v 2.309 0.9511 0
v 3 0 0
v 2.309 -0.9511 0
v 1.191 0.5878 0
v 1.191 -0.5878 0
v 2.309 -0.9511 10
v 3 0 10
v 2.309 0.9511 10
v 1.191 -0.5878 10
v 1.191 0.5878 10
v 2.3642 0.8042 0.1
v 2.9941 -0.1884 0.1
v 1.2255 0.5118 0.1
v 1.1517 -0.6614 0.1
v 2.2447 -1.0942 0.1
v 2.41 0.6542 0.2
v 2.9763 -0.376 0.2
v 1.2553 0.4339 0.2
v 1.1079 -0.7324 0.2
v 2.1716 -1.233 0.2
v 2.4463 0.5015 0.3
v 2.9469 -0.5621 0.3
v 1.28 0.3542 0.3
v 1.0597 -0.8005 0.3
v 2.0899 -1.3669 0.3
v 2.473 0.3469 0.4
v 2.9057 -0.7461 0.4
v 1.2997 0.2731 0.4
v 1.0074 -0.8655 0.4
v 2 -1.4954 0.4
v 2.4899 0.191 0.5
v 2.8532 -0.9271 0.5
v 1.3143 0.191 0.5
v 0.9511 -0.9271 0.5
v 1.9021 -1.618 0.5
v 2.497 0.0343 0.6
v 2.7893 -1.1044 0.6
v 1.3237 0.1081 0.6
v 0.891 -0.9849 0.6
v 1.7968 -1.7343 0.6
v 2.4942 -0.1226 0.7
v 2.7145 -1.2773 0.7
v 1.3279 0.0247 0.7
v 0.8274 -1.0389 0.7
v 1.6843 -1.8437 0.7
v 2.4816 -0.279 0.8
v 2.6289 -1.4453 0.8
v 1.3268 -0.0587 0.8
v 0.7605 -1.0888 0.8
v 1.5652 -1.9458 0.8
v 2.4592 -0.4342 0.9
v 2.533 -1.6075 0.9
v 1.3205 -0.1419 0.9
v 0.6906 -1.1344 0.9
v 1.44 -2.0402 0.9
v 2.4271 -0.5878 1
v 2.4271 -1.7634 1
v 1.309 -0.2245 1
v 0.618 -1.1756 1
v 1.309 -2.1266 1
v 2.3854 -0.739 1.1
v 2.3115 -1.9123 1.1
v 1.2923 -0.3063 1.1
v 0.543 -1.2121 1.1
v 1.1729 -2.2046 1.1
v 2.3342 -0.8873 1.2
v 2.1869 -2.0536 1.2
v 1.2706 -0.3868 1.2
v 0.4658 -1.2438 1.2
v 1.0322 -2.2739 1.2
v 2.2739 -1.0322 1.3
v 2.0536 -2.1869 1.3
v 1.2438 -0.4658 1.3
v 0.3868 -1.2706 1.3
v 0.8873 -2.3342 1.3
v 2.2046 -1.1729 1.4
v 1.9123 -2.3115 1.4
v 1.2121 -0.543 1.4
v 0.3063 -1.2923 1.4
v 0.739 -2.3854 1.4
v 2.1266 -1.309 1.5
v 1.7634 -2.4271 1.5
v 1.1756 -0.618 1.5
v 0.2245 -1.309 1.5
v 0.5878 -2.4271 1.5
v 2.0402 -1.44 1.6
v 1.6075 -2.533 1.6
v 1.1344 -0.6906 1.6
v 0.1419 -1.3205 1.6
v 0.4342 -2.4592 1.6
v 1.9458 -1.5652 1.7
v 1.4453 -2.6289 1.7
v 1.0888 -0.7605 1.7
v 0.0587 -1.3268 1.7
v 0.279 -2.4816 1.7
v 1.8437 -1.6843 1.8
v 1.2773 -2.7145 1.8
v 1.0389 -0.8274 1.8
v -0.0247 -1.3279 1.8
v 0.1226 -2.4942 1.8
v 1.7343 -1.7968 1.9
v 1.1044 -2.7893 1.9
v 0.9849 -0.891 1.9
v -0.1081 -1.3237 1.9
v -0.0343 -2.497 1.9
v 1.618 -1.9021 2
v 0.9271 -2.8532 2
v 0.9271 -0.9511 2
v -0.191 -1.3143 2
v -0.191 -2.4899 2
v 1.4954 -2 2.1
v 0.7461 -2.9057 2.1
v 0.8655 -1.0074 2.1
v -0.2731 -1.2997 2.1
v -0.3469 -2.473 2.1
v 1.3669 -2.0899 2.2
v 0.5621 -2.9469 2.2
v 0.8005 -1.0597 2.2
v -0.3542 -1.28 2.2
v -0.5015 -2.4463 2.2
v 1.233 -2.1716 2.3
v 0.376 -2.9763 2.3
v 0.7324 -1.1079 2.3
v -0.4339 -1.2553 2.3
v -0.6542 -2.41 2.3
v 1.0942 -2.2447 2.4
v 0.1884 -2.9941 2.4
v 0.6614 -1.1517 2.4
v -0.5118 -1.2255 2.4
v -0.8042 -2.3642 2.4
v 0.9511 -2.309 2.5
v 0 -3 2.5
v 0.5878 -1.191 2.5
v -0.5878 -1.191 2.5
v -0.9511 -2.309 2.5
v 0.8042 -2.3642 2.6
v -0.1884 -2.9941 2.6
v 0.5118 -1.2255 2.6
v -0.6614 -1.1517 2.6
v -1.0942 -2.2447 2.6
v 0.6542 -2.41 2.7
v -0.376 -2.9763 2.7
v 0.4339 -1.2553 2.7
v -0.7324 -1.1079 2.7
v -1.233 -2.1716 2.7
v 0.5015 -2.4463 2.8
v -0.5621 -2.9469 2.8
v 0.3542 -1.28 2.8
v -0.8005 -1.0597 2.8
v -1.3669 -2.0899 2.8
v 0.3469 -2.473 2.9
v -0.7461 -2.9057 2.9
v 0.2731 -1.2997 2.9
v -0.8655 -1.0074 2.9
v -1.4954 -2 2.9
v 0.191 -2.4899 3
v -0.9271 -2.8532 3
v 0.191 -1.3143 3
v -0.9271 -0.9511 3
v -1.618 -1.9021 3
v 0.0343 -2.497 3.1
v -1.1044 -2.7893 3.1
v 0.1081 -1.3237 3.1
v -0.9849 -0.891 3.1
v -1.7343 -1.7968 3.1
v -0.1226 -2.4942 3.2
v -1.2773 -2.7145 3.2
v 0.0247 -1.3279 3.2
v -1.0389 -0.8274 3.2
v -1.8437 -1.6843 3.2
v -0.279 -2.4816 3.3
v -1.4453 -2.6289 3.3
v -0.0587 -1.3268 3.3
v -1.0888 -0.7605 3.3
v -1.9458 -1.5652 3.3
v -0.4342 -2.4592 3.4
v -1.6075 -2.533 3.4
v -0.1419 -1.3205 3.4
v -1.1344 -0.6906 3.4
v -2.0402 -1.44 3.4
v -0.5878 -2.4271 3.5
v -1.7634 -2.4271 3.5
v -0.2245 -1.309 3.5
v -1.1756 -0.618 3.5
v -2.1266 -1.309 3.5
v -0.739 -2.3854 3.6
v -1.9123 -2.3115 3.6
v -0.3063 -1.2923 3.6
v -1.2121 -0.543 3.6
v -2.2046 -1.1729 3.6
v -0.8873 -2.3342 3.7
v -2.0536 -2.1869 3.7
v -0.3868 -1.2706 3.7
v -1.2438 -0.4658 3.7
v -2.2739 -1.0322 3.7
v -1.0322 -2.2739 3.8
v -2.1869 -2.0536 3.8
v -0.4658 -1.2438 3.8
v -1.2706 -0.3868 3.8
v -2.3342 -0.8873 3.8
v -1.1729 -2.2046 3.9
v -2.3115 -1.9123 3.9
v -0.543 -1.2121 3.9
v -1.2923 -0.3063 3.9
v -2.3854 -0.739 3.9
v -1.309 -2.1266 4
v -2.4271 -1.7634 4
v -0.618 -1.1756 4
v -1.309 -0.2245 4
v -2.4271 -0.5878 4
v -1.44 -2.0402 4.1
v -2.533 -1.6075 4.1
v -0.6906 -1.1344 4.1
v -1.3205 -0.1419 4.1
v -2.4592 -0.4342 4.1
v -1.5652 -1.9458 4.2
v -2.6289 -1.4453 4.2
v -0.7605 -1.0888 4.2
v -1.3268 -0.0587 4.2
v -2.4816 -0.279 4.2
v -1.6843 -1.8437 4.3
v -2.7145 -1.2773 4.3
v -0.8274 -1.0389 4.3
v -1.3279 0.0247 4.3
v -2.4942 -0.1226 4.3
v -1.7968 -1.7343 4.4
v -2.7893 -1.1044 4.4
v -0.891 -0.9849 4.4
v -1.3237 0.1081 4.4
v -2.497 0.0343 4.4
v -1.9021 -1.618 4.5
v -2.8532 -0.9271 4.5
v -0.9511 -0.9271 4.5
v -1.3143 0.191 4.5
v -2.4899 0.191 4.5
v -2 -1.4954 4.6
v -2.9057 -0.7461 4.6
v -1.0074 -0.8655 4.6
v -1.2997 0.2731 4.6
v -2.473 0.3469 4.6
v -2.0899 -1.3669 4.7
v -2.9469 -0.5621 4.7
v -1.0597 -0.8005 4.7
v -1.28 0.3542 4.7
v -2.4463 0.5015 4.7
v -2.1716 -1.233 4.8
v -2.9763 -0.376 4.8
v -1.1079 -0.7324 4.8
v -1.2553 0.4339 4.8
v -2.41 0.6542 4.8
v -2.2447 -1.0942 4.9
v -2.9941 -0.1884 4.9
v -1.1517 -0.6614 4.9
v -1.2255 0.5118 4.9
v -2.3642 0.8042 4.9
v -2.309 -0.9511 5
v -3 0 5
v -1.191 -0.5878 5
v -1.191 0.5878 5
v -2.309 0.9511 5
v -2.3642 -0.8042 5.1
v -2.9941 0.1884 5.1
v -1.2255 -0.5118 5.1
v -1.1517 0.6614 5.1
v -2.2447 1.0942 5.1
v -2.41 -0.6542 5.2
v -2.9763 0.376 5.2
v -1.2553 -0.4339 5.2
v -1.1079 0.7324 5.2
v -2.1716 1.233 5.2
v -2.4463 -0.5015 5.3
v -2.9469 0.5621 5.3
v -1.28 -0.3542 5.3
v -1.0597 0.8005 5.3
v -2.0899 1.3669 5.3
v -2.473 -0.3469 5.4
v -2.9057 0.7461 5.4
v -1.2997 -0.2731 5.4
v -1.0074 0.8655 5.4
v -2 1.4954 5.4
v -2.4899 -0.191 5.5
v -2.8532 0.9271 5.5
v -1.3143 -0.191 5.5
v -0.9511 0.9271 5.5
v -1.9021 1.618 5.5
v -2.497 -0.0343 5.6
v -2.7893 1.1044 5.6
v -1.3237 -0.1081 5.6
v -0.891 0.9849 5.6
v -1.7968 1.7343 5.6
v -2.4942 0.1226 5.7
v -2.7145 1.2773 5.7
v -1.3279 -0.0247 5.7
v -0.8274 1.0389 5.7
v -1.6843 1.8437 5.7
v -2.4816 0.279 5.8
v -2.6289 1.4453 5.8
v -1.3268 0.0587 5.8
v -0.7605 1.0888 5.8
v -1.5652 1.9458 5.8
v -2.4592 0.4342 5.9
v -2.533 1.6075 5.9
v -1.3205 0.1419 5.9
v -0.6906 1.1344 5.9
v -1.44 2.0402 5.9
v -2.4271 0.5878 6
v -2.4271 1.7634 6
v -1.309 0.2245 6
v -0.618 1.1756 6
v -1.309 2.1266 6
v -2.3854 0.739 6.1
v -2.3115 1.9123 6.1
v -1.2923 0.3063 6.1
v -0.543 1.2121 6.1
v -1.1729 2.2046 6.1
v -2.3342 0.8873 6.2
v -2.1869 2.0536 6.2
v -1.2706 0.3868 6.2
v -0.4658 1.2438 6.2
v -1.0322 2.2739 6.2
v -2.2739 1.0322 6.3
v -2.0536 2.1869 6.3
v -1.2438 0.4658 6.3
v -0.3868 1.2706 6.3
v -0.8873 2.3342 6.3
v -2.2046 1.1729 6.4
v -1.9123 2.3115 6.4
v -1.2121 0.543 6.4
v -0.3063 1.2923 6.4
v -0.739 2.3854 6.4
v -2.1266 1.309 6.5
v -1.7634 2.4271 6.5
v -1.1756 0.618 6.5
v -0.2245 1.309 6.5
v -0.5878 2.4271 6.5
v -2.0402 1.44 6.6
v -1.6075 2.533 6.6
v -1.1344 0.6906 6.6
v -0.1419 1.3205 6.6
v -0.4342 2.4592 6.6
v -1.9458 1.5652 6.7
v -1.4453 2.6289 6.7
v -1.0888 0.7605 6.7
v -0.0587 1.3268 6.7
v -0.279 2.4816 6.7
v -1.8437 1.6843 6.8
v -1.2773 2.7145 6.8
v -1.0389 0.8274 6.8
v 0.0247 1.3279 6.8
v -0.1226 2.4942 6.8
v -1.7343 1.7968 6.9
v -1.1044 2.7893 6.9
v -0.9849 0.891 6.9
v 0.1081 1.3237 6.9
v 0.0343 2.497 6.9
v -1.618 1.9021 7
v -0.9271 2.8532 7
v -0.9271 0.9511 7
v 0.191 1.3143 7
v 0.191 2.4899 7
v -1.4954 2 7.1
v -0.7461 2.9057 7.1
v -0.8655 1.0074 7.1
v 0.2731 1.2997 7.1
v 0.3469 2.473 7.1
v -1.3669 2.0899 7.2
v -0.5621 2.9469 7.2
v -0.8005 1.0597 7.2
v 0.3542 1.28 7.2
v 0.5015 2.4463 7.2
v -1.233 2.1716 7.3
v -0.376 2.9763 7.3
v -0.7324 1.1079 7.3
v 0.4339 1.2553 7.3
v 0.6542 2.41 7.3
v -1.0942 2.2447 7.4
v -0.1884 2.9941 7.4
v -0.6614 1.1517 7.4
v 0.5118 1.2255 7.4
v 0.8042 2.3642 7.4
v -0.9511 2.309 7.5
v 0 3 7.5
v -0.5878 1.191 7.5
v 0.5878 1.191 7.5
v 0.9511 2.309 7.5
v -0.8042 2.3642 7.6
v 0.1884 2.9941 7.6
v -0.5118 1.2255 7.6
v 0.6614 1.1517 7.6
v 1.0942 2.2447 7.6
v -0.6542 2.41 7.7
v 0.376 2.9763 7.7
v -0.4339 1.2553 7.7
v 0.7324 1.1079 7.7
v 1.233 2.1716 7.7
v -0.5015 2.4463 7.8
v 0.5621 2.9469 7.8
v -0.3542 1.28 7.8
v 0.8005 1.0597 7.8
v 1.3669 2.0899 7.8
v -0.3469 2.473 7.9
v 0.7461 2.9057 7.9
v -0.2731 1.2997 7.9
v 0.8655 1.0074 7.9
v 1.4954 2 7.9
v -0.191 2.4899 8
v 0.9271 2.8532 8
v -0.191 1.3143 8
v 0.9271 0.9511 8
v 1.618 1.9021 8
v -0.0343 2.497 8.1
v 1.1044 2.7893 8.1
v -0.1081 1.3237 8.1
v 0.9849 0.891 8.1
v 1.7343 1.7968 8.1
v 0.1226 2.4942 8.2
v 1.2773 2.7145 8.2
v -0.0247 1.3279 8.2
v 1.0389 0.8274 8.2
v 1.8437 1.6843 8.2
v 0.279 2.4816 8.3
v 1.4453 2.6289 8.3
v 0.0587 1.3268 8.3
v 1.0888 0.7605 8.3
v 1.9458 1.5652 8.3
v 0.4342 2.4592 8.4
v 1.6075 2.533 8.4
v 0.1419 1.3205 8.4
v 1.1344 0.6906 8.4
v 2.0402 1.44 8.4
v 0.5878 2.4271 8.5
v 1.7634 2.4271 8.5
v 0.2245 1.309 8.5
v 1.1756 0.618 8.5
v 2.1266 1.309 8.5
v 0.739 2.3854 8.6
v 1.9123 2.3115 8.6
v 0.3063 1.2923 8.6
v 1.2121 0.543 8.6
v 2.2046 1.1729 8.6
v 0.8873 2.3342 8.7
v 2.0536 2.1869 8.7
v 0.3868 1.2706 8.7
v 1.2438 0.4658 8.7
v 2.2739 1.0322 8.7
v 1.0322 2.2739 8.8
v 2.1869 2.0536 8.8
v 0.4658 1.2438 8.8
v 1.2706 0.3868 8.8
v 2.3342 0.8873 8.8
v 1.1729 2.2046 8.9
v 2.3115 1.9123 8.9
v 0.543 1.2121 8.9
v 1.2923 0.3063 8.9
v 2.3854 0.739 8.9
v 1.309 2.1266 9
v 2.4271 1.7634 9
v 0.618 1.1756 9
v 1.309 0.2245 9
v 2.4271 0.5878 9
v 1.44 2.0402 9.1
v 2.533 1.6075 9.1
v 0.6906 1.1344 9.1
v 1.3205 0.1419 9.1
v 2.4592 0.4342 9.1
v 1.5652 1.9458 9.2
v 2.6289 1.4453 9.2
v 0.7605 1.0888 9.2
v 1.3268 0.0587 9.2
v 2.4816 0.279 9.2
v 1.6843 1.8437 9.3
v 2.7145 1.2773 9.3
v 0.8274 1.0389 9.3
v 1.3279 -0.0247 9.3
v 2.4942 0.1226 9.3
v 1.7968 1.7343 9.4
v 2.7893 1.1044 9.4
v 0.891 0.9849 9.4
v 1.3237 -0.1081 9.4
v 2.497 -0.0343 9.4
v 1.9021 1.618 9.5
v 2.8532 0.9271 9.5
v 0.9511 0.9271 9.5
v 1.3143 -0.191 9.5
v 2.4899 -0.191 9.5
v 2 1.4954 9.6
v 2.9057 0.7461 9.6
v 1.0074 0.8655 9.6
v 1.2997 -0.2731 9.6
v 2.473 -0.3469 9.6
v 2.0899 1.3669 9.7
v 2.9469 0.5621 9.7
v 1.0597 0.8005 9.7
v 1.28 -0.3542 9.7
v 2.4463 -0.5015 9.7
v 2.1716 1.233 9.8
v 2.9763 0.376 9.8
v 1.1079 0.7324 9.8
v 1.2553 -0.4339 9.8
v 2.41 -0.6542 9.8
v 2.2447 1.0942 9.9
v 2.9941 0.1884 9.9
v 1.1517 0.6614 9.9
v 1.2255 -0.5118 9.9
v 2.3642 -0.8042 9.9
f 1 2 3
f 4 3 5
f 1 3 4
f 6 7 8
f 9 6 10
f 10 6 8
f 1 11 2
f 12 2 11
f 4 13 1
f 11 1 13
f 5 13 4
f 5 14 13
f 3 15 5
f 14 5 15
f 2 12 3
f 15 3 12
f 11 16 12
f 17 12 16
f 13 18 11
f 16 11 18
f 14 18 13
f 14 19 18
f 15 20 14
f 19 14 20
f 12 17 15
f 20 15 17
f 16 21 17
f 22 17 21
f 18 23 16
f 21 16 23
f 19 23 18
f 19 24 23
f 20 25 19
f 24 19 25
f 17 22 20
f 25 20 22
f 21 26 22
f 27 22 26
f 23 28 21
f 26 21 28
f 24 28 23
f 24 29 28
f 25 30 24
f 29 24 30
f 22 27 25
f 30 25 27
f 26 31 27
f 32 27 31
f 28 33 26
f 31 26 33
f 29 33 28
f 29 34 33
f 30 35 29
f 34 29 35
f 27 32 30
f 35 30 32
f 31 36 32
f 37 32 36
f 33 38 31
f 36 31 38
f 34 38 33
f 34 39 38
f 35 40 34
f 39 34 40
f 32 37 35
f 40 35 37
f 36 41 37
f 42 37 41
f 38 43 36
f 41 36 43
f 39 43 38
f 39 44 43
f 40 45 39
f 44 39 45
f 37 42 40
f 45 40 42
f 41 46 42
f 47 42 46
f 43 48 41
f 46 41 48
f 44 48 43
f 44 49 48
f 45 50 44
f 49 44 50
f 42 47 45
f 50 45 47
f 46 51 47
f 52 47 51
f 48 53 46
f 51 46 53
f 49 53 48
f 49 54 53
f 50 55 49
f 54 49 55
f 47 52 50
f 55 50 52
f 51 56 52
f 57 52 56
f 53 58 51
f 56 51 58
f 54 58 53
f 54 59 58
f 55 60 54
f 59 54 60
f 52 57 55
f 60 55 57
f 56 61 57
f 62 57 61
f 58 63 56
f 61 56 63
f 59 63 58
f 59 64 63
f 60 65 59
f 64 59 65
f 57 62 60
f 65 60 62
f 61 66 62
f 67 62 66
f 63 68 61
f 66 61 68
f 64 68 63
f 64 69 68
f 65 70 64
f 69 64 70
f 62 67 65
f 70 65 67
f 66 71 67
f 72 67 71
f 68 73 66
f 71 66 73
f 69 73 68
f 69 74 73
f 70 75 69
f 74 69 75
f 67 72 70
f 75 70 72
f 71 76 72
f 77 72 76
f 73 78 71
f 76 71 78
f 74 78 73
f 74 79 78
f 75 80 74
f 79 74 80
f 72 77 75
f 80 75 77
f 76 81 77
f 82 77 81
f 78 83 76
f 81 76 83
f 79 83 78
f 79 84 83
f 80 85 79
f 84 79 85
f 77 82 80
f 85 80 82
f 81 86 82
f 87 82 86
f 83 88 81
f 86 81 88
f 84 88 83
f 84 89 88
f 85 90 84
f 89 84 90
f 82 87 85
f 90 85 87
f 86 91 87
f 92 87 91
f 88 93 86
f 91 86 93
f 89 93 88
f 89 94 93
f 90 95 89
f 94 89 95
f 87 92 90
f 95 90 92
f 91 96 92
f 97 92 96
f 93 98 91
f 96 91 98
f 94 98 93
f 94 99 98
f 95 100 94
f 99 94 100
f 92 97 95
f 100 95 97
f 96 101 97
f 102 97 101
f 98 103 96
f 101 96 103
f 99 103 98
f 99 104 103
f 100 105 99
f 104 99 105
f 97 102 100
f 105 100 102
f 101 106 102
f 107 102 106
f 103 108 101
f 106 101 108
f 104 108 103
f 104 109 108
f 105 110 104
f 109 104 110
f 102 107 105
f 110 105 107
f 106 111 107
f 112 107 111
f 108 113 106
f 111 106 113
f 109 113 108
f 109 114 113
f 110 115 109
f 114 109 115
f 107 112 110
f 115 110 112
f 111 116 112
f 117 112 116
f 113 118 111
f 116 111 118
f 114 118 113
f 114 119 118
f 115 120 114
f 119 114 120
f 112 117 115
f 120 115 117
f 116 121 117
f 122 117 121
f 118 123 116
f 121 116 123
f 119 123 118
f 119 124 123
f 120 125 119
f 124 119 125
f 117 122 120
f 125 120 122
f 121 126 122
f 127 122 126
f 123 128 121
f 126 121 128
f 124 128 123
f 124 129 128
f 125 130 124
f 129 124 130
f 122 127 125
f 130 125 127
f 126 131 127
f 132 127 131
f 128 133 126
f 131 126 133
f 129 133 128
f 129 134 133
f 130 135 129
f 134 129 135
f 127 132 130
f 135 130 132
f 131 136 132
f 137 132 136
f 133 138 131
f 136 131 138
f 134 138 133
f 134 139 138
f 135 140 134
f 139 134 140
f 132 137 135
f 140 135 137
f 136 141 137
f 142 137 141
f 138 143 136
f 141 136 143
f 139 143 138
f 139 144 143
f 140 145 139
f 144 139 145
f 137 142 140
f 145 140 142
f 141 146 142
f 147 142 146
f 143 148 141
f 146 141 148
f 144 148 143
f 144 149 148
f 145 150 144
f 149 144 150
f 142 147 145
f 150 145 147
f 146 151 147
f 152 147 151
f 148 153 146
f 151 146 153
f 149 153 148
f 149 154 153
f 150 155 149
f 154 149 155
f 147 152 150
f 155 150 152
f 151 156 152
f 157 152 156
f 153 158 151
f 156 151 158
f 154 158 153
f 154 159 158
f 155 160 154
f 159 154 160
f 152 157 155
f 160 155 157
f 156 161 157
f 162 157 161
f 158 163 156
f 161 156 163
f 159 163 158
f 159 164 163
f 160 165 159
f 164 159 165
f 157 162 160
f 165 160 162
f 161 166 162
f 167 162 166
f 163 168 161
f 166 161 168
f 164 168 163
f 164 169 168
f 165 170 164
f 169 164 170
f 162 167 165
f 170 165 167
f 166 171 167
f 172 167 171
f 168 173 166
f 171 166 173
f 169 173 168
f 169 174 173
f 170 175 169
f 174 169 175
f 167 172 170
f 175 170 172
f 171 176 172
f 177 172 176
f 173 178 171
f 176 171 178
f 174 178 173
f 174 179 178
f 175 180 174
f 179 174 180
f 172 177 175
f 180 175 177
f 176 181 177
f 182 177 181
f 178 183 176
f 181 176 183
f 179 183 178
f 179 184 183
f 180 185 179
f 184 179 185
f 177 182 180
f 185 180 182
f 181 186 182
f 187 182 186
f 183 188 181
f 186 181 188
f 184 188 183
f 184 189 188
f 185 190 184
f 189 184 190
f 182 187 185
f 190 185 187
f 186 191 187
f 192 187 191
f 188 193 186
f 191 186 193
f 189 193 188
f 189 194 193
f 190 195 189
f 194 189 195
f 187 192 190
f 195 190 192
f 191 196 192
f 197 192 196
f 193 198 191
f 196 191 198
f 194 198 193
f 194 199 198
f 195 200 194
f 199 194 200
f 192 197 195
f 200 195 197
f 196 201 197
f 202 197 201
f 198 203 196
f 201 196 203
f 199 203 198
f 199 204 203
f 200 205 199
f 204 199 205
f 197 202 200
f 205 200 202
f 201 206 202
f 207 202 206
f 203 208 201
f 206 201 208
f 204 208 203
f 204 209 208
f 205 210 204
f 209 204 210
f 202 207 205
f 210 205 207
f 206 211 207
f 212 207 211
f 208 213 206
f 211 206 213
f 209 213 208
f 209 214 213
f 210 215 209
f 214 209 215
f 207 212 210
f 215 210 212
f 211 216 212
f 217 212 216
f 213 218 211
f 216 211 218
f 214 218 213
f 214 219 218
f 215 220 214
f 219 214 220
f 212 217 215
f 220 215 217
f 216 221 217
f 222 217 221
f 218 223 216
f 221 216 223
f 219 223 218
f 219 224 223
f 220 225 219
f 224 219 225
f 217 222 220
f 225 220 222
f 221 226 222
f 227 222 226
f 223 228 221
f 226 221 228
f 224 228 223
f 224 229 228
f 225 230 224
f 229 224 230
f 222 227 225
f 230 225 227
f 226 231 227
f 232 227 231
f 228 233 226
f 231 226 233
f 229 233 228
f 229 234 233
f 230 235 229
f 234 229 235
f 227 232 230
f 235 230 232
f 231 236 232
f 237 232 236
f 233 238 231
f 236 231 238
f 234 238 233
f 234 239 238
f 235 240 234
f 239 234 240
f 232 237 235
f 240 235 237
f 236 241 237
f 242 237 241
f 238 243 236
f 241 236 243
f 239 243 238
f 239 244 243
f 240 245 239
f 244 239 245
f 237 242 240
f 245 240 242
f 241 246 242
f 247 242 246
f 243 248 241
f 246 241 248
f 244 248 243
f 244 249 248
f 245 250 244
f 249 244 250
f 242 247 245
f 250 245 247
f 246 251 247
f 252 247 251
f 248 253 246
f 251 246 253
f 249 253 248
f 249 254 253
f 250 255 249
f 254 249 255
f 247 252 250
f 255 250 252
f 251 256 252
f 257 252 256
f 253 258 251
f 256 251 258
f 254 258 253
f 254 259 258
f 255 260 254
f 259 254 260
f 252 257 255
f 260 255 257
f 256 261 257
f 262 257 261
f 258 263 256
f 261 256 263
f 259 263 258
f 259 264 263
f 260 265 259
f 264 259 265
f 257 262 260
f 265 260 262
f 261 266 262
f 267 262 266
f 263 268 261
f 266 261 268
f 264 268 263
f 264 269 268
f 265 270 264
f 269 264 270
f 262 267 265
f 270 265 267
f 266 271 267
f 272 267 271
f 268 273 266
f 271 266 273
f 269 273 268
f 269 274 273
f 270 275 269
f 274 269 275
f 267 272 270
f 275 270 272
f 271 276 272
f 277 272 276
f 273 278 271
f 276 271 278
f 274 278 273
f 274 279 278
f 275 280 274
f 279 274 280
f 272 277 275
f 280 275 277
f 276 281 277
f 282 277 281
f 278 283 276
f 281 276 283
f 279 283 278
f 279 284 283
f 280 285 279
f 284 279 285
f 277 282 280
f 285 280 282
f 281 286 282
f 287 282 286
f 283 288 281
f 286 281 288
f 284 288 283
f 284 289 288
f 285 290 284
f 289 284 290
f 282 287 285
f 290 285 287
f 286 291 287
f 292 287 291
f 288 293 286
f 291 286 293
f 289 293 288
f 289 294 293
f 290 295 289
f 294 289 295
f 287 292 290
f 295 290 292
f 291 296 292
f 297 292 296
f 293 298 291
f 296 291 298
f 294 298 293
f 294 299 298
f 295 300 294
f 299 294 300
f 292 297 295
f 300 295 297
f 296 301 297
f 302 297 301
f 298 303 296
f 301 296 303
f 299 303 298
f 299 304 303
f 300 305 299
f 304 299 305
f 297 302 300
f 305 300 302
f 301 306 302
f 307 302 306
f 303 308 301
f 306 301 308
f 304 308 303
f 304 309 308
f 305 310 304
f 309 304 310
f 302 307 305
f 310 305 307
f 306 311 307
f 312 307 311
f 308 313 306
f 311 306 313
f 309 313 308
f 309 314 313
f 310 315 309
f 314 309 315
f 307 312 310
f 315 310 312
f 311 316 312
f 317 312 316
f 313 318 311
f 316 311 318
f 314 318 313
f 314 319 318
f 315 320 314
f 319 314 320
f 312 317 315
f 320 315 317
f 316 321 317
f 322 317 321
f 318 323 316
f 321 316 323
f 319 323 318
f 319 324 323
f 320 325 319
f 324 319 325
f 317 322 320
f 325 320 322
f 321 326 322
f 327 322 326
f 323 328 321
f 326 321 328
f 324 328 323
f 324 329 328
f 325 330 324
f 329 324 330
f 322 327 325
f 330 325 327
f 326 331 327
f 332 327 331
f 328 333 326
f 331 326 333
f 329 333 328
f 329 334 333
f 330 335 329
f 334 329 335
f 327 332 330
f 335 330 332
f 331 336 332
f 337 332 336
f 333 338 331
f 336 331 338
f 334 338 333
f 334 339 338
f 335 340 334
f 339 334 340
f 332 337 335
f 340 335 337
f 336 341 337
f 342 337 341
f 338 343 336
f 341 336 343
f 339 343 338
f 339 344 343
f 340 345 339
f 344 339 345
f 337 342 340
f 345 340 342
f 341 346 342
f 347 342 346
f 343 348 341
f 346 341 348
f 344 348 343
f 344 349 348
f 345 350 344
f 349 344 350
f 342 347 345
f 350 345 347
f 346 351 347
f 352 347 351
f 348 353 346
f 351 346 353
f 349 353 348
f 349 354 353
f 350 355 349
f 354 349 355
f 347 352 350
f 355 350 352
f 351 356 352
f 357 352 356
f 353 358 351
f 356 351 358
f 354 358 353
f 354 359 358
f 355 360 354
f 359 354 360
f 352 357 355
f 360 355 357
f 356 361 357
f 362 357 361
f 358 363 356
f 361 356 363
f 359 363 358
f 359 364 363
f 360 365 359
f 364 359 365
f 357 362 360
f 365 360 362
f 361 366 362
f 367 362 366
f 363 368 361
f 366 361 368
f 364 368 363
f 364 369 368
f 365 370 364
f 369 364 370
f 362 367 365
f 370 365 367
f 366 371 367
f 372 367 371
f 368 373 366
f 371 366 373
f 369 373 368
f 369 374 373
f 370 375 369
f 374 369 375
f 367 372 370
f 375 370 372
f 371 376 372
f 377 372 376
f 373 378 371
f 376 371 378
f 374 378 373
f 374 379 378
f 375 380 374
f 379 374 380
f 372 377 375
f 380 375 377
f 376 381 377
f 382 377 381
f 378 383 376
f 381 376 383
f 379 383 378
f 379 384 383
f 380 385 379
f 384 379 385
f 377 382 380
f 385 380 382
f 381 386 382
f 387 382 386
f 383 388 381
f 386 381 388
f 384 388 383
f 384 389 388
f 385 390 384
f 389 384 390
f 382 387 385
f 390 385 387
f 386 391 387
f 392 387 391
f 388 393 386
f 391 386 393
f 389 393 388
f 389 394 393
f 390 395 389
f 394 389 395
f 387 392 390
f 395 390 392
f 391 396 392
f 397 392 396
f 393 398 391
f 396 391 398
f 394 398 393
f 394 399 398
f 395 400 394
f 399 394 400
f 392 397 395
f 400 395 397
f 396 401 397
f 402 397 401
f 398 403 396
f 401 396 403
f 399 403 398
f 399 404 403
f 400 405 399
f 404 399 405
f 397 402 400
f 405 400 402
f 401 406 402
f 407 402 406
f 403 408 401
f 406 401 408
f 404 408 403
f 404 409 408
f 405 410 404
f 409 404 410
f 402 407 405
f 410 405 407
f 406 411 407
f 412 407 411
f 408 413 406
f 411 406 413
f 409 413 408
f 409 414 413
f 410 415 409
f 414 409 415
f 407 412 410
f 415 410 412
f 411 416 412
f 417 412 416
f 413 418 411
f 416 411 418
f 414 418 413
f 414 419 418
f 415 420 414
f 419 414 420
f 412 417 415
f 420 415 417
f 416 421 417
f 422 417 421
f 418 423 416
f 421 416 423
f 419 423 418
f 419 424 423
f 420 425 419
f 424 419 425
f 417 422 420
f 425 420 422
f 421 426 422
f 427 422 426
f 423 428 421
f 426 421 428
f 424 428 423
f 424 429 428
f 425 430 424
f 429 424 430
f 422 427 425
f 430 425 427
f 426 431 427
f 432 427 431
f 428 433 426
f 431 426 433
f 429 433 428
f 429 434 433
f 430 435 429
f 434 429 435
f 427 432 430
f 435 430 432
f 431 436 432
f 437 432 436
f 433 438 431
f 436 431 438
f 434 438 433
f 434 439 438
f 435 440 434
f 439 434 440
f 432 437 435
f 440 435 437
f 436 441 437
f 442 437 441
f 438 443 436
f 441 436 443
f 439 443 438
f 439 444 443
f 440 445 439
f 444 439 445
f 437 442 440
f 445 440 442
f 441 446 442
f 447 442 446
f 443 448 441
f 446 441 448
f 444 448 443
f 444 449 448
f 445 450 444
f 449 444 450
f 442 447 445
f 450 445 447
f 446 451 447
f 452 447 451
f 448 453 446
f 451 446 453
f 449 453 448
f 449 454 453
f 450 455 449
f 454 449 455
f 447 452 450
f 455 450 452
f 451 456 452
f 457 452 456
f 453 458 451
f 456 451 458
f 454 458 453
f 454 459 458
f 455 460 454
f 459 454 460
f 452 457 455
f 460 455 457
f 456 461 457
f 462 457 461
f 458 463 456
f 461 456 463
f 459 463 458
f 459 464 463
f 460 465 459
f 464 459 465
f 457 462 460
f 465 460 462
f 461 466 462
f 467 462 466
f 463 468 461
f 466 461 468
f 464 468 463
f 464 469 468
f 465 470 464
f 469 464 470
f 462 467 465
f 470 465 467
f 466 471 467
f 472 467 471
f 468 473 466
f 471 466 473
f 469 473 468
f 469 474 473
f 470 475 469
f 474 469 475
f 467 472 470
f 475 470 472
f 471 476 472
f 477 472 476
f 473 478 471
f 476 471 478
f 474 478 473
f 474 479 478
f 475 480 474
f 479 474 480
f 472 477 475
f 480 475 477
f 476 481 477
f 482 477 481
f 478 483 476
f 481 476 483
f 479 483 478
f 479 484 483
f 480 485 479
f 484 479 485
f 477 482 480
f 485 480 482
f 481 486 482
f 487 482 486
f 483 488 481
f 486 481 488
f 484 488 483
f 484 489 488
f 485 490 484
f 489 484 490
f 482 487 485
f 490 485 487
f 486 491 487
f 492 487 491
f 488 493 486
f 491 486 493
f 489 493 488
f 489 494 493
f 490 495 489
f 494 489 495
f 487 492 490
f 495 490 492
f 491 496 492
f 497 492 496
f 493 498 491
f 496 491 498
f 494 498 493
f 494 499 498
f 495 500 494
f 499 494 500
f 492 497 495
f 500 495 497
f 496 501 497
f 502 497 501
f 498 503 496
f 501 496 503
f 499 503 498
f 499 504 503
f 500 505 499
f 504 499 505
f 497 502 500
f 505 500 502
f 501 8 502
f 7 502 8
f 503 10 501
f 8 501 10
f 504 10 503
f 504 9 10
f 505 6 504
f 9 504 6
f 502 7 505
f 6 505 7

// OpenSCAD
linear_extrude(height = 10, center = false, convexity = 10, twist = 360, slices = 100)
translate([2, 0, 0])
circle(r = 1);
